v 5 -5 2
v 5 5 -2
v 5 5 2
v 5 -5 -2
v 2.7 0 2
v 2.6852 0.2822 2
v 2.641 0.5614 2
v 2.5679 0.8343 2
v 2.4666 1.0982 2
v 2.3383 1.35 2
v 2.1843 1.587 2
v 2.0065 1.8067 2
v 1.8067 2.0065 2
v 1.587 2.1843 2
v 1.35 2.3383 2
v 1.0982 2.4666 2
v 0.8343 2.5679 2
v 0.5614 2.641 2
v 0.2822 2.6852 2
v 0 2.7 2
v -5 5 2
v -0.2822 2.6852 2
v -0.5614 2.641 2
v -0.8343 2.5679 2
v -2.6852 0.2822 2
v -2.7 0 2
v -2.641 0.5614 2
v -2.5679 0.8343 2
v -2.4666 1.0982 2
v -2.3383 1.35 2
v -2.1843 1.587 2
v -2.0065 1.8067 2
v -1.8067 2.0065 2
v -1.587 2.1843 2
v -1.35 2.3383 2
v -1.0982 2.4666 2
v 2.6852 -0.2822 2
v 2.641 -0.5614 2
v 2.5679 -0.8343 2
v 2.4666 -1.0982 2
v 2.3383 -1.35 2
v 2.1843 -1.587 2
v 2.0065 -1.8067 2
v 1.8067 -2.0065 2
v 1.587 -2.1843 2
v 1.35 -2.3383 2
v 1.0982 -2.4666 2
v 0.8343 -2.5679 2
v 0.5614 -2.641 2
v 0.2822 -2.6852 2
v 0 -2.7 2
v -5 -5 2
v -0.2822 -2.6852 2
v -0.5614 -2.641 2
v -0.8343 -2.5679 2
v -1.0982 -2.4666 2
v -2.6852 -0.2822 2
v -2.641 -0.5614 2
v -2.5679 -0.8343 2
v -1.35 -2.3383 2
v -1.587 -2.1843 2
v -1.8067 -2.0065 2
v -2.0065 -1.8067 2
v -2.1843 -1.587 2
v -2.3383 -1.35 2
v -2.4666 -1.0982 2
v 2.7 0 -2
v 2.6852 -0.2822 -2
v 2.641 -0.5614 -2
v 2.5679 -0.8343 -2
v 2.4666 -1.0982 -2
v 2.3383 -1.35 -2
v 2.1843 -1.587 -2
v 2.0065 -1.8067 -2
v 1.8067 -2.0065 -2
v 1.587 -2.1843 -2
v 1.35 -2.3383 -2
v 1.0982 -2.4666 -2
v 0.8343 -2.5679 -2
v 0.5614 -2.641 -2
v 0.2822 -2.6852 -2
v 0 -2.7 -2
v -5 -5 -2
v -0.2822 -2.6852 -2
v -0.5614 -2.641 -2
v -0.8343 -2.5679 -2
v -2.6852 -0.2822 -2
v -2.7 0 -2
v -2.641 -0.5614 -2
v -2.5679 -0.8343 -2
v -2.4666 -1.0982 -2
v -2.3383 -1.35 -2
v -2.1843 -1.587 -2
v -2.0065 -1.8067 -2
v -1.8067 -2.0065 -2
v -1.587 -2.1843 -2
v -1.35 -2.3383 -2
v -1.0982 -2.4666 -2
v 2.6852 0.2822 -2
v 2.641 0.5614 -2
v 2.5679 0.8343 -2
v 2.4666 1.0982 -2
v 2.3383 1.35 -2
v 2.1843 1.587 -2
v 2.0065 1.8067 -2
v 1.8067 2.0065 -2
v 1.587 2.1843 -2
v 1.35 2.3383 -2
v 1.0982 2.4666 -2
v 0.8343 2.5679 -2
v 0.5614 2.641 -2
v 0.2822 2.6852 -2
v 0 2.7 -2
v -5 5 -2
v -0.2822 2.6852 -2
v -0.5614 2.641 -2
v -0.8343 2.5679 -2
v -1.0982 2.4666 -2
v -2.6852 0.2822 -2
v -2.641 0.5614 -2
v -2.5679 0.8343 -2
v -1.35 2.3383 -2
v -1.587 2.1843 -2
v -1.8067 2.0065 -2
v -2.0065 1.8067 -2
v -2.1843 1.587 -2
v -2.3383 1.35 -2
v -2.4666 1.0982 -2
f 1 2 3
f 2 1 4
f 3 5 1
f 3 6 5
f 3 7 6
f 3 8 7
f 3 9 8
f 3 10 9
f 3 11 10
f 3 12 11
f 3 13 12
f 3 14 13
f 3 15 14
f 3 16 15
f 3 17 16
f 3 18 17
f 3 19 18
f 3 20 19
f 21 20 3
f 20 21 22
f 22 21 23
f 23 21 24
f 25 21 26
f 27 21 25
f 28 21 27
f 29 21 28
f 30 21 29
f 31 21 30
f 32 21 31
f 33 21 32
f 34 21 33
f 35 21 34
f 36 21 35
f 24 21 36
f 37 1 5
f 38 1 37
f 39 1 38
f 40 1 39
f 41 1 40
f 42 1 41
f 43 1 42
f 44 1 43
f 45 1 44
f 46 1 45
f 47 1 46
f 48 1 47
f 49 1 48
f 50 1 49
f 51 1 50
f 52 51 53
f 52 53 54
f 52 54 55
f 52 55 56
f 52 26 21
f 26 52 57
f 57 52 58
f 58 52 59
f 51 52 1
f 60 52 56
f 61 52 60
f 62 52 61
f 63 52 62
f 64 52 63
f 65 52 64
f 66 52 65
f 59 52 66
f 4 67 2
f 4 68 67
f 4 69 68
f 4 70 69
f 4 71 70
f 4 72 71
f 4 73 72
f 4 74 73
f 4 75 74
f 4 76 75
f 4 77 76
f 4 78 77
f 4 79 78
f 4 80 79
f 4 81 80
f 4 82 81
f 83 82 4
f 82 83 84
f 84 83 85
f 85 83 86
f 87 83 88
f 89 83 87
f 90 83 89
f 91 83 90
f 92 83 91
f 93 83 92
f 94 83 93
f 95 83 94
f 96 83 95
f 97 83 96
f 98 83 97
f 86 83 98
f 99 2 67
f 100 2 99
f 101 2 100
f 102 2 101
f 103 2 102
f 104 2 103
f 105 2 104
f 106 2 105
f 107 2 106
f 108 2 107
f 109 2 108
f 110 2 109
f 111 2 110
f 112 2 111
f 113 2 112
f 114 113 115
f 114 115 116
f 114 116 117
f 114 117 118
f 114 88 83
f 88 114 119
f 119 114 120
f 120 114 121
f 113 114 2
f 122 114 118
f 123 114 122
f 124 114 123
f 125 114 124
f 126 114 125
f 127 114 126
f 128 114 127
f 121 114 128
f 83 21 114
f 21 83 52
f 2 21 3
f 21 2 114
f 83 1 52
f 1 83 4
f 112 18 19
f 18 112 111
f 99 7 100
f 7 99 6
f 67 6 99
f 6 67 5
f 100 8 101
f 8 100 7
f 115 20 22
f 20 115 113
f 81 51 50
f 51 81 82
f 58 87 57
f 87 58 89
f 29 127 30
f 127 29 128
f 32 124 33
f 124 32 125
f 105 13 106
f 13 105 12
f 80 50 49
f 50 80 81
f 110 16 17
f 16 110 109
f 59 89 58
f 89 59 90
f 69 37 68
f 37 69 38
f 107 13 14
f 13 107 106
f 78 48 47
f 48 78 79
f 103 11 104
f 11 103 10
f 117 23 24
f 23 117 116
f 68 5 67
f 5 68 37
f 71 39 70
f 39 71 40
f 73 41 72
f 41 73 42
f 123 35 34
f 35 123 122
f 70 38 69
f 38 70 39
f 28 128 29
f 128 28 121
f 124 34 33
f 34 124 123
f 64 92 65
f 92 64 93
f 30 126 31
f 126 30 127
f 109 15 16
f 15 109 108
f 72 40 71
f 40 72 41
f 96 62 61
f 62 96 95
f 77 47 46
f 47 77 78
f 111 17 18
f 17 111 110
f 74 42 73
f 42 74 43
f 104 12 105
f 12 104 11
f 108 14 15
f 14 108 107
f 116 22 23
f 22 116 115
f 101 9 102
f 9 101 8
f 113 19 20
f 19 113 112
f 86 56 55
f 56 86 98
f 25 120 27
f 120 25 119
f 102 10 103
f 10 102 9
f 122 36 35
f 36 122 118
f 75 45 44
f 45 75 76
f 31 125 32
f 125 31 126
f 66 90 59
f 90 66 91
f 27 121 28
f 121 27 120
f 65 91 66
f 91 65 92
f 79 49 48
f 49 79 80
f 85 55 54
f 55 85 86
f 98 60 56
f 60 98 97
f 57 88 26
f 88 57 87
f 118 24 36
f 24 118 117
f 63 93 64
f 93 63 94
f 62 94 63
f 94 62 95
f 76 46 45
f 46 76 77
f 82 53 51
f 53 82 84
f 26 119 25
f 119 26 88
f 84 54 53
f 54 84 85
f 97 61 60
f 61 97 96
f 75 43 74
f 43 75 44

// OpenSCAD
// Square nut.
$fn = 60;
eps = 0.02;
thread_d = 5.4;
side = 10;
thickness = 4;
difference() {
    cube([side, side, thickness], center = true);
    translate([0, 0, -thickness / 2 - eps]) cylinder(d = thread_d, h = thickness + 2 * eps);
}
